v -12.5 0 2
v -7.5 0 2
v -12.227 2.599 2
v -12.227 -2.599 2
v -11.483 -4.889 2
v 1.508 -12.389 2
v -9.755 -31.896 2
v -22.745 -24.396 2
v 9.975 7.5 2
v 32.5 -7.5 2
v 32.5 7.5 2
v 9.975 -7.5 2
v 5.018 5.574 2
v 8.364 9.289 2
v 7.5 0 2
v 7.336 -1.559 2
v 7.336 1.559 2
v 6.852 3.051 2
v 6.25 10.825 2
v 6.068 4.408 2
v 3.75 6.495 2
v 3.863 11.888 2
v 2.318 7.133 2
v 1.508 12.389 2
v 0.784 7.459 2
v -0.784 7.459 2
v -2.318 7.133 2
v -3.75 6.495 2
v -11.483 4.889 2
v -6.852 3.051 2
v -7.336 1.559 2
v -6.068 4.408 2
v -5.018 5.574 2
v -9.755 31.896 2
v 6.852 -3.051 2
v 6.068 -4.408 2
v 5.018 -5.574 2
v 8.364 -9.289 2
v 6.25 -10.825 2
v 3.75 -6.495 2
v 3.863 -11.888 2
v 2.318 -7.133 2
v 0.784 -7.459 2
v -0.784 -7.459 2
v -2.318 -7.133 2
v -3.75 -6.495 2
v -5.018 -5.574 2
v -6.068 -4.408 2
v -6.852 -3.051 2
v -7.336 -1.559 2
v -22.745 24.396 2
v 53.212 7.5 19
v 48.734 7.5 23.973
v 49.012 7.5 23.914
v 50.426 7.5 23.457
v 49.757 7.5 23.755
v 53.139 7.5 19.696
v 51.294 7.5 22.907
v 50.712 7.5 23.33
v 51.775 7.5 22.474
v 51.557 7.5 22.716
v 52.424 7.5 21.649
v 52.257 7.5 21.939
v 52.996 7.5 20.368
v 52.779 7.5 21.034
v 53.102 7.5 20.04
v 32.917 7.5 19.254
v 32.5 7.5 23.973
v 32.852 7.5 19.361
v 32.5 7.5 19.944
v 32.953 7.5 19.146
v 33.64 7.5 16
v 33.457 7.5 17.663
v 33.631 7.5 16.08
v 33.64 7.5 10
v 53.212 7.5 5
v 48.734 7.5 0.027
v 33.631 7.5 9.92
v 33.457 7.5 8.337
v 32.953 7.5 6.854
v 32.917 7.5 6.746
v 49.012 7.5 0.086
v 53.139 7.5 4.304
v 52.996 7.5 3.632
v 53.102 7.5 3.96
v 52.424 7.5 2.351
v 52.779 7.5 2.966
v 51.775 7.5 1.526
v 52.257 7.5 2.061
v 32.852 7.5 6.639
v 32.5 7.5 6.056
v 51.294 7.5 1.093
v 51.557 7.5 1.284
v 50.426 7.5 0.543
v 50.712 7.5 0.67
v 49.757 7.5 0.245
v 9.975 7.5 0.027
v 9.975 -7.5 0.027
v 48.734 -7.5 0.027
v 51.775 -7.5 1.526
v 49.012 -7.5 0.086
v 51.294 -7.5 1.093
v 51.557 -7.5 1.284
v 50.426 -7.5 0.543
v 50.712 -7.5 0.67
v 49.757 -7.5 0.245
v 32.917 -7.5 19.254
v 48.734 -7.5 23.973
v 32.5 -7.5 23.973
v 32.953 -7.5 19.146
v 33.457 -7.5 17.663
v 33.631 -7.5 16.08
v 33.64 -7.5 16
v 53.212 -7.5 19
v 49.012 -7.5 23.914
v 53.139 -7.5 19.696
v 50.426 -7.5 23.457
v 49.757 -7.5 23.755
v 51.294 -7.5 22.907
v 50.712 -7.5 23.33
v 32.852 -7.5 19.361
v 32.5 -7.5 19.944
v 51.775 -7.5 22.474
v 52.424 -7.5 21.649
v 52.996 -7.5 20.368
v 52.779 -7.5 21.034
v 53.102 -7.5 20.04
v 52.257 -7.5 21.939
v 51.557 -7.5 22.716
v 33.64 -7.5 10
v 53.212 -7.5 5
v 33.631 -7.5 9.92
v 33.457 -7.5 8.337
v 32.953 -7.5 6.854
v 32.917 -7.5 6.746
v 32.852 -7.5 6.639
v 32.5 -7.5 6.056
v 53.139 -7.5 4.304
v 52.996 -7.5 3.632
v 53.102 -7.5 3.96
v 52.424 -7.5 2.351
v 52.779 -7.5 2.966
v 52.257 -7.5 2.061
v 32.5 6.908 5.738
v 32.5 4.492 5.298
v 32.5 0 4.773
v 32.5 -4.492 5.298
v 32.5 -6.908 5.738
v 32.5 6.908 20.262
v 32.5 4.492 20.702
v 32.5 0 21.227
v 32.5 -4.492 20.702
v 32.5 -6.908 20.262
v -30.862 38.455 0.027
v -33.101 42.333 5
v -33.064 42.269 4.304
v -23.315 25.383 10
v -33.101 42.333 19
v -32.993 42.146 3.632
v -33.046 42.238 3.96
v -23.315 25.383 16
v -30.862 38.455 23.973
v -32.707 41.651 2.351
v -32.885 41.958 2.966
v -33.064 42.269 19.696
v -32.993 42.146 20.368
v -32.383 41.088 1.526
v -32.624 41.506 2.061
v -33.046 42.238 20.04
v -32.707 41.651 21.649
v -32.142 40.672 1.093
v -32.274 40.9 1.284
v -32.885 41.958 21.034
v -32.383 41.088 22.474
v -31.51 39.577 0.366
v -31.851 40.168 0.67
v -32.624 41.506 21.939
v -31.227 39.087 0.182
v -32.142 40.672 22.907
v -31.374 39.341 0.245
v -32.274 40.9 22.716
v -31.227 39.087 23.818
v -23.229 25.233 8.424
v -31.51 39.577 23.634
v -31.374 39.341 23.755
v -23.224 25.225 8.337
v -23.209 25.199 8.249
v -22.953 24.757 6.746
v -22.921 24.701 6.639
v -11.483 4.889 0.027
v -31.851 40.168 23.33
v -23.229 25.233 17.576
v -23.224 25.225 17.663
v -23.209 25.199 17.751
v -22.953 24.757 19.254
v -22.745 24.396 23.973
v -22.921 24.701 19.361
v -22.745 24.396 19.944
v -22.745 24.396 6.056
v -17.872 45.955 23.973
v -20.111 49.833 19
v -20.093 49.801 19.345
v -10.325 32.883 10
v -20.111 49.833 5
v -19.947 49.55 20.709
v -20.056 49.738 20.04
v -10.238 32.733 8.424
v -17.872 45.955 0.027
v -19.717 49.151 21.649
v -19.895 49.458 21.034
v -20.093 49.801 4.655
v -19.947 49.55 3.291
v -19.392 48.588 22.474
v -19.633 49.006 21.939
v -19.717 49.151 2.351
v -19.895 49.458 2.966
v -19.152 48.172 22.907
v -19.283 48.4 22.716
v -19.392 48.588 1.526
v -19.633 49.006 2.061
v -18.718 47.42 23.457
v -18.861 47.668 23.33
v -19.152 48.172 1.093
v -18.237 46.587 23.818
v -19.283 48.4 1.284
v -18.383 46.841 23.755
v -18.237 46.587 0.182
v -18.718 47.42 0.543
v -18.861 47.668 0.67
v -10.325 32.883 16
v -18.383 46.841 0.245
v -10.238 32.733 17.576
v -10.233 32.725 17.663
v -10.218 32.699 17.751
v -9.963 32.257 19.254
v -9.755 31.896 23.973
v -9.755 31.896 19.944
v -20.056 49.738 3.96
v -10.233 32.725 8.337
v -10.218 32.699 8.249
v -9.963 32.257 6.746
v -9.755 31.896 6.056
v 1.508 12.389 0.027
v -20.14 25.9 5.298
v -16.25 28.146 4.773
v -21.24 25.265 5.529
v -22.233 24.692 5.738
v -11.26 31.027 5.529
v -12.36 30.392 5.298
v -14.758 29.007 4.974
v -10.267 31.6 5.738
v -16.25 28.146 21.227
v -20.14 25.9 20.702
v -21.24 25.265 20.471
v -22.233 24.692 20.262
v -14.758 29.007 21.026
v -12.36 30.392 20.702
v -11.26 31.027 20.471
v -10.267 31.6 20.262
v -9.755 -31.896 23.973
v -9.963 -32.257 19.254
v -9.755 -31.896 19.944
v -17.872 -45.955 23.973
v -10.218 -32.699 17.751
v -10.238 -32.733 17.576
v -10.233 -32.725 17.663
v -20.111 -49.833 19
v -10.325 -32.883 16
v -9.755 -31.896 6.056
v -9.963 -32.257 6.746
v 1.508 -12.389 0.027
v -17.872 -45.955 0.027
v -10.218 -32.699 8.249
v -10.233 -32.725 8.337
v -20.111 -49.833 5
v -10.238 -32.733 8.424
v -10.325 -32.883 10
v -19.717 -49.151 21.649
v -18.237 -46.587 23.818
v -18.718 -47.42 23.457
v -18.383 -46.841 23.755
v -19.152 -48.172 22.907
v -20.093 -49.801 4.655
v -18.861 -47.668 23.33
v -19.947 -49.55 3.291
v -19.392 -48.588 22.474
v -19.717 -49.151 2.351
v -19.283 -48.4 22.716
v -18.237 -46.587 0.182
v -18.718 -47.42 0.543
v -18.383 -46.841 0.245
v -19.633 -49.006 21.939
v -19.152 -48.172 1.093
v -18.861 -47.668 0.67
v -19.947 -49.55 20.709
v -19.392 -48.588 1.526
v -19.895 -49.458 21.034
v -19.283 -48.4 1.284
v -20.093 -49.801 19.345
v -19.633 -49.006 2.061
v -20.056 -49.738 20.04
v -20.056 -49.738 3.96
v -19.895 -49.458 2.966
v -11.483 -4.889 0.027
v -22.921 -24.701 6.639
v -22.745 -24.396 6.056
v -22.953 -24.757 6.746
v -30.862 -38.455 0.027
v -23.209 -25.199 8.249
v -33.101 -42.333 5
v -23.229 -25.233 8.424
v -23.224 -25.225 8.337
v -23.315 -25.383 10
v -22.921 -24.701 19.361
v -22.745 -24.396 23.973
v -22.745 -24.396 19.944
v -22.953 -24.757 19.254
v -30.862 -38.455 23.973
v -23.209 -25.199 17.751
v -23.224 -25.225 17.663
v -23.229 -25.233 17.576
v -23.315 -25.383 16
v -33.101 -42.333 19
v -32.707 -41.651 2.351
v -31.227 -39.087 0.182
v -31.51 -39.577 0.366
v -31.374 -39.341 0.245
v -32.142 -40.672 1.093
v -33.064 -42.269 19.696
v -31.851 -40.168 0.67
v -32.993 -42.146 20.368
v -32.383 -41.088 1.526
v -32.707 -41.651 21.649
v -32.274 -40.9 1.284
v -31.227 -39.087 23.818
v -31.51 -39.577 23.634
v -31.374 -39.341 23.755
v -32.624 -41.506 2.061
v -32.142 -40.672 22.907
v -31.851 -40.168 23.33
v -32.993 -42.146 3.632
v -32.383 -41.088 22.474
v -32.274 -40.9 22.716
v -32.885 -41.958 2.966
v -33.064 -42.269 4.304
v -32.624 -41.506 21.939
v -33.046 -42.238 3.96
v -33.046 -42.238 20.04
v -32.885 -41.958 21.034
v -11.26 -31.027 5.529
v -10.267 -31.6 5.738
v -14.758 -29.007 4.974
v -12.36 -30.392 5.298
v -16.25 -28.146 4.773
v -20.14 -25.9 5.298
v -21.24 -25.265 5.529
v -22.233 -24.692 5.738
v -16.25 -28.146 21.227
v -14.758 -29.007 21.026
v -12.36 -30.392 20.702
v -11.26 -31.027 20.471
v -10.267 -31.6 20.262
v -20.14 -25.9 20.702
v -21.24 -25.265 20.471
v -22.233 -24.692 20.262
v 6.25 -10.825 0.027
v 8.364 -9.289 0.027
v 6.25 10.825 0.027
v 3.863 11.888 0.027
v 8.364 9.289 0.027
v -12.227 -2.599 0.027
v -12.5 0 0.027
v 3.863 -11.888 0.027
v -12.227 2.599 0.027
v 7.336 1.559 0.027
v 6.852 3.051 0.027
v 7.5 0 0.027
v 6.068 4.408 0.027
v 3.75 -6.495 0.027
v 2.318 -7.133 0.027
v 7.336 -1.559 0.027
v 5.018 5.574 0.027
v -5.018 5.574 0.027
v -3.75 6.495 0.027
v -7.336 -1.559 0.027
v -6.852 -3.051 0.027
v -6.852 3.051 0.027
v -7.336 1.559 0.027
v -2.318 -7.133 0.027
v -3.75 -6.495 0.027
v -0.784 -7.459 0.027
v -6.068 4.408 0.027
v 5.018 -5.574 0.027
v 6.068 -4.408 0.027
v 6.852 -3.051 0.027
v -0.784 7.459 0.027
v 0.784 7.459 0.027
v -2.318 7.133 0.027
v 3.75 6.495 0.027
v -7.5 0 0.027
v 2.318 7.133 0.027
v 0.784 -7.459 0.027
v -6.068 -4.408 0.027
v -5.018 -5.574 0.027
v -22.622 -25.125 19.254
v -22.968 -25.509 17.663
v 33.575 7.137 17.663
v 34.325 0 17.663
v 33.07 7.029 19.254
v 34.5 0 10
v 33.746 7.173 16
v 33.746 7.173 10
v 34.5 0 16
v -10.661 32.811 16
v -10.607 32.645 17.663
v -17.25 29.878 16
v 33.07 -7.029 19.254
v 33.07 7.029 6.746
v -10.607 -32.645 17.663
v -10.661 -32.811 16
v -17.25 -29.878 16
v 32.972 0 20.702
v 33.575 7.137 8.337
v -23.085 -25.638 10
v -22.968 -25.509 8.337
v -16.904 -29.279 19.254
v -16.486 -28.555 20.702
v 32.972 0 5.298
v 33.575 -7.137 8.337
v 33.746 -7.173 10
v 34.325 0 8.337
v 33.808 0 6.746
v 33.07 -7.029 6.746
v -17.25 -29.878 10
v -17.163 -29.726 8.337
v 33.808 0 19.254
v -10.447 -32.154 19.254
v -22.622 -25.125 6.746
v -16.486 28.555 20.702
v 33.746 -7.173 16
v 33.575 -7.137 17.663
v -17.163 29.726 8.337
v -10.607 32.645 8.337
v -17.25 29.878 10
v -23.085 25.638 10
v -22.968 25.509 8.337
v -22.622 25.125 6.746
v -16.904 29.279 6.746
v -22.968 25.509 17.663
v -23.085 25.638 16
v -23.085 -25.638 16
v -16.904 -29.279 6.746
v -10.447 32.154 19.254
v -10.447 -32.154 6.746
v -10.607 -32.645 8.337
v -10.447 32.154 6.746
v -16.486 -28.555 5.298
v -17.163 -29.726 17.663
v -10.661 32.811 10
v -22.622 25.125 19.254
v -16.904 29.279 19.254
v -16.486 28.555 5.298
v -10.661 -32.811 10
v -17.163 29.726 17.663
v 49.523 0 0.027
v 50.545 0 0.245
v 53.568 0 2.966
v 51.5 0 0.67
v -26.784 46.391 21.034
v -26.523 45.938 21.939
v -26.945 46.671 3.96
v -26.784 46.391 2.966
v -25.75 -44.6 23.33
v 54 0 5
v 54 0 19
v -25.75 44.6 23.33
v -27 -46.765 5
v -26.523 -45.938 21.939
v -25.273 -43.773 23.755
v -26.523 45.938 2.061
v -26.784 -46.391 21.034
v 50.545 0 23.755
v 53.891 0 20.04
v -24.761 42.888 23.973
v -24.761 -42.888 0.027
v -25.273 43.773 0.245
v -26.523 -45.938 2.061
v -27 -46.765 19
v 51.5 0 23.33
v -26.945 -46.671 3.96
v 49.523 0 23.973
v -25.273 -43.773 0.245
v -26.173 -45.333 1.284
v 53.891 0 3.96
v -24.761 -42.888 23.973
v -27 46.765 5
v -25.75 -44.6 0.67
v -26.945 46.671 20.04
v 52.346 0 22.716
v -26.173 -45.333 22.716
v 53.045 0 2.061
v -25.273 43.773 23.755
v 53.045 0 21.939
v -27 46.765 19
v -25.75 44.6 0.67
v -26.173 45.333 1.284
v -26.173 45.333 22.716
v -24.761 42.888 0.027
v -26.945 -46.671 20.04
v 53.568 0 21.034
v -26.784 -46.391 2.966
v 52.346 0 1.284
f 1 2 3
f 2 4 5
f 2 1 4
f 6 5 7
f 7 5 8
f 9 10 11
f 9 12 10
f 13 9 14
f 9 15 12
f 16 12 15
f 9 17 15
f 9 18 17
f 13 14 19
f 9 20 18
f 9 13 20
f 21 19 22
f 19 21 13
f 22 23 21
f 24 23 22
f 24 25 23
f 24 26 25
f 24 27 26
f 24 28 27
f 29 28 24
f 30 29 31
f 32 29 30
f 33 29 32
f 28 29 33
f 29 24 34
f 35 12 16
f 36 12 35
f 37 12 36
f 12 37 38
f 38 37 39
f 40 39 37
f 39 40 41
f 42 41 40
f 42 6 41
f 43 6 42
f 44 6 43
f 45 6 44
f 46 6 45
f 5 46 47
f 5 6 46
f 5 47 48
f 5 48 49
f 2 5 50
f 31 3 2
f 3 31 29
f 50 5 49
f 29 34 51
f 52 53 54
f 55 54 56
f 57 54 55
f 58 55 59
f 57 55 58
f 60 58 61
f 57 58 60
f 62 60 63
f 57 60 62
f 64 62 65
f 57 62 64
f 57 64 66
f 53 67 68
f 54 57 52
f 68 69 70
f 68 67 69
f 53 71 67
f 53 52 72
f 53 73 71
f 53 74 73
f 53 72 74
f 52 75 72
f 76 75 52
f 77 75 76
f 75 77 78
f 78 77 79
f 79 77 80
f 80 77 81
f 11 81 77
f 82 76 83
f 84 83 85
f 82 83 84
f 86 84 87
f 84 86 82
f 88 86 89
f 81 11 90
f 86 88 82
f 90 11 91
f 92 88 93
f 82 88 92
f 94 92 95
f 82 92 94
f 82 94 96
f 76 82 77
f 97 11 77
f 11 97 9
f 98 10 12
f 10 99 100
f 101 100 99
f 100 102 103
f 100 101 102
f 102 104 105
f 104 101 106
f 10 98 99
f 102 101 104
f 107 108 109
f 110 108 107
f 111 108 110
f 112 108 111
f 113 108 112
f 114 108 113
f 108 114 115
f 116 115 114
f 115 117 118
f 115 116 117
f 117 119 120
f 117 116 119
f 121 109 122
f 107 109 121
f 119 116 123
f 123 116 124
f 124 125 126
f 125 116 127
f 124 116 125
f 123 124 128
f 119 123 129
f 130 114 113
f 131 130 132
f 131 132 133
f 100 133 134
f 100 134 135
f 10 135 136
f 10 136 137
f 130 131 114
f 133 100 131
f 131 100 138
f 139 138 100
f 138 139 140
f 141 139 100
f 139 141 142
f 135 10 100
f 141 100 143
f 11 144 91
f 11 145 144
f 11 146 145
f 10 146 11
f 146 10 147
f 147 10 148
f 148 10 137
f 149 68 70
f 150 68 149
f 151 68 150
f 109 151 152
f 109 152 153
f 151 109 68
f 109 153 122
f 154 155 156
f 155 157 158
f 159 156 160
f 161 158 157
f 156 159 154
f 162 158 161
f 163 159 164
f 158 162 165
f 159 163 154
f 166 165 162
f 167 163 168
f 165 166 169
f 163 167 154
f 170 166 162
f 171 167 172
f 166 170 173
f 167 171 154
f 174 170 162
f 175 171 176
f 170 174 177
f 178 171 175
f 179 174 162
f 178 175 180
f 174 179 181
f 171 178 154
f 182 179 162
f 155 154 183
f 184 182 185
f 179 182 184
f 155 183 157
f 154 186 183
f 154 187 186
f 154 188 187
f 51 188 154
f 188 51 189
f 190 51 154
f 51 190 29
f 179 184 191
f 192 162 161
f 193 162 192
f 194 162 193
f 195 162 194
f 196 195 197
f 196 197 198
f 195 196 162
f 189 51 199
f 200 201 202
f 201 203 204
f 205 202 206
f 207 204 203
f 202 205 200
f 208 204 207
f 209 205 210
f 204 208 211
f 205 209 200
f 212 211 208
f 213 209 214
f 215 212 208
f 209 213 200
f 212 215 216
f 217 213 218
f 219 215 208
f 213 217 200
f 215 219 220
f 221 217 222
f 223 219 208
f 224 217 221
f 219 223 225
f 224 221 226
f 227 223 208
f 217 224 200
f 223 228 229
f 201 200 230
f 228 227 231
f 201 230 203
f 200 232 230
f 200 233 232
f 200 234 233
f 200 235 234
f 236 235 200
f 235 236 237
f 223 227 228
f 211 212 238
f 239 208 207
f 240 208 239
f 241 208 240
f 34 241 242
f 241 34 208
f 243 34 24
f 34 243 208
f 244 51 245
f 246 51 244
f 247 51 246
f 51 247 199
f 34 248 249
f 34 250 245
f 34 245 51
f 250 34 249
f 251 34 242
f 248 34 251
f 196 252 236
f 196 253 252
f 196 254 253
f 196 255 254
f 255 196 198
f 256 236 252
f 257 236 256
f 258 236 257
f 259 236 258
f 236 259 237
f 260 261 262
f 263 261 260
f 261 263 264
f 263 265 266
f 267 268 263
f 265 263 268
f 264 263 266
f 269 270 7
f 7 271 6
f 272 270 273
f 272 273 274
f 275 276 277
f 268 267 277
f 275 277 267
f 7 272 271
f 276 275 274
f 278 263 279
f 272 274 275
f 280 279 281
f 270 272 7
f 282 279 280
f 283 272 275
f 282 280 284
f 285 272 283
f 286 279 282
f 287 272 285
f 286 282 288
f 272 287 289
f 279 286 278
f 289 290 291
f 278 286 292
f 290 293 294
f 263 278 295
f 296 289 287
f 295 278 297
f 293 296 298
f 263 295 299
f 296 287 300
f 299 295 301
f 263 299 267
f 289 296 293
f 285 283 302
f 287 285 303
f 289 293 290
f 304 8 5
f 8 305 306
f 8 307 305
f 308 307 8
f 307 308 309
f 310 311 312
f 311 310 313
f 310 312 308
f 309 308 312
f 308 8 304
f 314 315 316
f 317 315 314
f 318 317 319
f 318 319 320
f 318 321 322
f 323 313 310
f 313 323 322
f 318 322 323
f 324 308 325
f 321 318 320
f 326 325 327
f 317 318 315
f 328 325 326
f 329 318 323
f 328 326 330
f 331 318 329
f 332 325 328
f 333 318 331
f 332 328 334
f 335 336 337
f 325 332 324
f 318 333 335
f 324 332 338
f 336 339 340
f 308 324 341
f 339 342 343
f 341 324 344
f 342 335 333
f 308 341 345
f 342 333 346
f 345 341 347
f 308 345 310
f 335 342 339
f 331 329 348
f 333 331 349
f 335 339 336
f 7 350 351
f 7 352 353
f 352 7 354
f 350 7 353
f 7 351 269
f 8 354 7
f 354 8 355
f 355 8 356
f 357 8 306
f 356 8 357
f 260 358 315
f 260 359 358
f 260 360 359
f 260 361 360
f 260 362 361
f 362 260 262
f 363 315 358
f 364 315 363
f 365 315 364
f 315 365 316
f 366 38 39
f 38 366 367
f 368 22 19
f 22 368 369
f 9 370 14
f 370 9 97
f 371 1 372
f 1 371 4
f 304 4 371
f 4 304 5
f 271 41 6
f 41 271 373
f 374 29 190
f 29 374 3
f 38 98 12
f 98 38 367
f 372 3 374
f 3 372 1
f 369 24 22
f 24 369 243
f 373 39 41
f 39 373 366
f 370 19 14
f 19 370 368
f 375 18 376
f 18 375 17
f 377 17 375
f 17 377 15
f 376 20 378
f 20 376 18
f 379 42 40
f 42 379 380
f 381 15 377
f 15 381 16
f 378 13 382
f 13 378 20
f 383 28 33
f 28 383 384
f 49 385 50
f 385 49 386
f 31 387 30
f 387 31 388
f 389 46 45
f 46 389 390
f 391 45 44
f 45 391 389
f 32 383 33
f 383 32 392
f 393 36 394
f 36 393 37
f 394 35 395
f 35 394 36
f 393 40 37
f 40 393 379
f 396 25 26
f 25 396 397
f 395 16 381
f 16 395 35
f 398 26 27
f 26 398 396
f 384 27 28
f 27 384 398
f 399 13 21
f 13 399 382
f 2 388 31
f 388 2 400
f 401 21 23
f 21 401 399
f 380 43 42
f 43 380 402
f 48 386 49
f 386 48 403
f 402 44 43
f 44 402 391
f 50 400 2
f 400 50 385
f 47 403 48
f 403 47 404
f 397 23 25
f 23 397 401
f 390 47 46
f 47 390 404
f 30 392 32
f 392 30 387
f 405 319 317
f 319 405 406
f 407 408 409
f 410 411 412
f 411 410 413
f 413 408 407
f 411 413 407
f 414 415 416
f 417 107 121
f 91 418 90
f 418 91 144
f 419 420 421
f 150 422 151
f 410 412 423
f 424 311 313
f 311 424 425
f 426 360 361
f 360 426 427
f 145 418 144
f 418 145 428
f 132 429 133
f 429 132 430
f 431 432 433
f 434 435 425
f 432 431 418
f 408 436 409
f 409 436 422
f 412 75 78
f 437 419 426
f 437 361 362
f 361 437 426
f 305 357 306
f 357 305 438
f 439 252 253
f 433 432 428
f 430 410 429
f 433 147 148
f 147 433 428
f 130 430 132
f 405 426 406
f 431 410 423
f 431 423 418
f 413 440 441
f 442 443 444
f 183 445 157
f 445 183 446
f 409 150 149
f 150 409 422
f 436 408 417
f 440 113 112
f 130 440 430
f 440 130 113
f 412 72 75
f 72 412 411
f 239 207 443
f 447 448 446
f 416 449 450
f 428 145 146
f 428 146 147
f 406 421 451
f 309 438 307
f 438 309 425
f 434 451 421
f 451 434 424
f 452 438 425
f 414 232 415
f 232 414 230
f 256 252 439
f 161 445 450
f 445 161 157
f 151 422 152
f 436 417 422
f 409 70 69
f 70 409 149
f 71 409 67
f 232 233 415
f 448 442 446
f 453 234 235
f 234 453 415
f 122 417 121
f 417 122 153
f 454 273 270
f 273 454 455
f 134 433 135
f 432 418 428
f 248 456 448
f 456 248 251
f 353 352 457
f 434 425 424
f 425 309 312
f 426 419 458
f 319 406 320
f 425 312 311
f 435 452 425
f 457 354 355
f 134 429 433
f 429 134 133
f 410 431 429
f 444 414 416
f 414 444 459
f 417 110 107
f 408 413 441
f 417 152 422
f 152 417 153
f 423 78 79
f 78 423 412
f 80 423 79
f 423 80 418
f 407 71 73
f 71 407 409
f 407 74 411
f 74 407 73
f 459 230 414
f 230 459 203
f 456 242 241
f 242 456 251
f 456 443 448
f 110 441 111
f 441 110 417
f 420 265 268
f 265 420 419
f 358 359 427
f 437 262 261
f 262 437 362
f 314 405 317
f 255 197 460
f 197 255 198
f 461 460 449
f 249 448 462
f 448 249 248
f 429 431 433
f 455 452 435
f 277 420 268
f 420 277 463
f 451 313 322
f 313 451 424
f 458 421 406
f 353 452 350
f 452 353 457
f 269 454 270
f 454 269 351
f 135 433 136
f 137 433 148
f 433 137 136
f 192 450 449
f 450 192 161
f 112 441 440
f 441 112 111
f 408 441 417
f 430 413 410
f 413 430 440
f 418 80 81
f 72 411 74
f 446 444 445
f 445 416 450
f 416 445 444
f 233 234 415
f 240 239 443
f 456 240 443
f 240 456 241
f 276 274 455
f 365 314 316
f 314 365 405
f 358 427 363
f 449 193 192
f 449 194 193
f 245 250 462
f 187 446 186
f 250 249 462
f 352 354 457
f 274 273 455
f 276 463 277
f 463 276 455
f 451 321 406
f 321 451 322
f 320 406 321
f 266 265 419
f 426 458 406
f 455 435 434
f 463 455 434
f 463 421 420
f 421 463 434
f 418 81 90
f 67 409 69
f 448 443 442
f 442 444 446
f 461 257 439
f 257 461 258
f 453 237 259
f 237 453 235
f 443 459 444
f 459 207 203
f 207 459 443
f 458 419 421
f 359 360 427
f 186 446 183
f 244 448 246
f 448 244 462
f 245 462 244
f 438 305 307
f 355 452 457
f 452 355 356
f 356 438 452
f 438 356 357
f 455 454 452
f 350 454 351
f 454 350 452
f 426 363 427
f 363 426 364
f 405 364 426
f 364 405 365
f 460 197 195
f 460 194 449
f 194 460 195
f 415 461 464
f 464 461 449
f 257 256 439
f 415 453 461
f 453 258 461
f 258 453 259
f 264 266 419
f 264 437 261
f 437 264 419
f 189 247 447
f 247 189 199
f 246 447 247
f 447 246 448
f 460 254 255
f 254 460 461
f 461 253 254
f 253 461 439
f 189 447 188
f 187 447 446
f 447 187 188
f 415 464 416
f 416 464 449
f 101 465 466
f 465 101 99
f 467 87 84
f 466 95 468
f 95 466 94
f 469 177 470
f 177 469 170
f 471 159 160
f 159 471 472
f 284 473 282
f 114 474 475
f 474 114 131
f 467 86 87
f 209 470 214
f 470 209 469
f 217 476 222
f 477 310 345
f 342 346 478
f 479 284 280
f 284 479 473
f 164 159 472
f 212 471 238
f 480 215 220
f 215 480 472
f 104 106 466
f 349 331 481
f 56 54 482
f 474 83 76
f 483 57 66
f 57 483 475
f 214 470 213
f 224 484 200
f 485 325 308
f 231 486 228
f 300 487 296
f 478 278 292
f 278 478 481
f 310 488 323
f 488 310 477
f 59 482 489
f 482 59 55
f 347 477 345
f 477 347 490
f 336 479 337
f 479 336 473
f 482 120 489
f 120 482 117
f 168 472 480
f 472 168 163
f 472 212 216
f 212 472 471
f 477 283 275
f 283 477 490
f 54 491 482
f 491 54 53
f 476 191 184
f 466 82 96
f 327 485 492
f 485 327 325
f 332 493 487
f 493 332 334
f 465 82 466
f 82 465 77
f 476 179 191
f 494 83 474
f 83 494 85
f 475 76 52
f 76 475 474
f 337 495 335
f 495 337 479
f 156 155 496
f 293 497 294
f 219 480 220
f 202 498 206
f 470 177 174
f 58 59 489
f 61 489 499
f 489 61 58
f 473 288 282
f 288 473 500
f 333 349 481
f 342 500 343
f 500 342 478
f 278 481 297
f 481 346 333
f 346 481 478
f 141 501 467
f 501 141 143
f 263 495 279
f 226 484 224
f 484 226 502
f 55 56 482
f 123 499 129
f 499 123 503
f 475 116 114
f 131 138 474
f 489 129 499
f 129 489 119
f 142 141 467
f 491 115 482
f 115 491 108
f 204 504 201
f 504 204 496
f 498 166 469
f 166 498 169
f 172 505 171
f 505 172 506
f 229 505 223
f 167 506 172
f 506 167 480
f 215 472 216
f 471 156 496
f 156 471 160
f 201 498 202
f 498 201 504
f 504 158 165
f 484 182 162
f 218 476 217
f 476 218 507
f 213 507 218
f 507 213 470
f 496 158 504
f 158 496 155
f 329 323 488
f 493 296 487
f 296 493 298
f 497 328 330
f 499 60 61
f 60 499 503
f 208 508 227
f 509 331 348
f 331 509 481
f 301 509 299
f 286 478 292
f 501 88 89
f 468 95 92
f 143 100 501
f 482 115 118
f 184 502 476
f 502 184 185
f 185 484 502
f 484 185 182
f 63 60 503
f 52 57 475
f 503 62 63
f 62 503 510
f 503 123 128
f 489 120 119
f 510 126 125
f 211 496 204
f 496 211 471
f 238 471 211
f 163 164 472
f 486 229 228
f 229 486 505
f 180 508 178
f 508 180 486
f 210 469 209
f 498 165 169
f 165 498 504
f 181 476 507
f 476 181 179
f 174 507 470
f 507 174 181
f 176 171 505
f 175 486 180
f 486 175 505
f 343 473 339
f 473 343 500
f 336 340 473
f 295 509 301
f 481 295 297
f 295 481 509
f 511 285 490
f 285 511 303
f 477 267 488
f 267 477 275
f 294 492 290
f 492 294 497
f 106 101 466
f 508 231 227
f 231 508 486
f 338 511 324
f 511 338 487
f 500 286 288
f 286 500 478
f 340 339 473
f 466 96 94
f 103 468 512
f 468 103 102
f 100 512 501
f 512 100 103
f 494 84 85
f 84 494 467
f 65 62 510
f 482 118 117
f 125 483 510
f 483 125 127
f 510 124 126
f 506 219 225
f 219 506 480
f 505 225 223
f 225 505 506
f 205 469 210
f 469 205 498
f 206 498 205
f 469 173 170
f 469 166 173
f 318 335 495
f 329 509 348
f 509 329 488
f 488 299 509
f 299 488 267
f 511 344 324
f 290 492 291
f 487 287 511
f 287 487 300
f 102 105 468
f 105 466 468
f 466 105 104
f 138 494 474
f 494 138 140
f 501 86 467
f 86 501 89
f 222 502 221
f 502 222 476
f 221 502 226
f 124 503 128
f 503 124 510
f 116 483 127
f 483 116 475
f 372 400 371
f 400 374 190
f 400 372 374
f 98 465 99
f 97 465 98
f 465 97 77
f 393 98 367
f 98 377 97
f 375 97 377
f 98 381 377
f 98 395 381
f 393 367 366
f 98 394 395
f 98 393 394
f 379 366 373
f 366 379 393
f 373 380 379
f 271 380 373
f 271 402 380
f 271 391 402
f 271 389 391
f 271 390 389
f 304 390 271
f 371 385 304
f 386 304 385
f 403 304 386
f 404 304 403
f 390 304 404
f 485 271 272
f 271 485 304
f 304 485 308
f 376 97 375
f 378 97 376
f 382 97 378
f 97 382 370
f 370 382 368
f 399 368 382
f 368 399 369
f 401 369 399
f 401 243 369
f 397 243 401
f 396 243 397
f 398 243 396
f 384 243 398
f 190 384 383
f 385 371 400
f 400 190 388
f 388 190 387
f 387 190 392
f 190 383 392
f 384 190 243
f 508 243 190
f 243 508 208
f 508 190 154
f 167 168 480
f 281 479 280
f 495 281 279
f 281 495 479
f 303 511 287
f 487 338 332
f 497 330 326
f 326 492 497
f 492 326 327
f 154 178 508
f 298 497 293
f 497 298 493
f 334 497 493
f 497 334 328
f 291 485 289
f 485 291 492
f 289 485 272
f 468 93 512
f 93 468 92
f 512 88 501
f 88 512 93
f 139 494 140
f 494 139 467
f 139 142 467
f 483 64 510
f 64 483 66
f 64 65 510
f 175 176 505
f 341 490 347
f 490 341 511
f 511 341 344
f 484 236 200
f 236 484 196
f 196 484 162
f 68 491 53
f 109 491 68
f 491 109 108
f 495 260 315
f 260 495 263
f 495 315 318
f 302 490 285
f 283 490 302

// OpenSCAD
/*
  RC plane wheel wedge
  
  (c) 2018 Janne Mäntyharju
*/

// Thickness of support plate
thickness = 2;

// Diameter of support disk
middle_disk_diameter = 25;

// Tire diameter
tire_diameter = 69;

// Tire width
tire_width = 22;

// Tire rounding
tire_rounding = 8;

// Diameter of center hole to leave space for wheel collar
center_hole_diameter = 15;

// Width of support arms
arm_width = 15;

// ignore variable values
$fn = 30;
wedge_size_multiplier = 2.5;
outer_radius = (tire_diameter / 2) + thickness * wedge_size_multiplier * 0.8;

x = ((tire_diameter /2) / cos(60)) - arm_width;

// EMBEDDED rcube.scad MODULE

// Rounded primitives for openscad
// (c) 2013 Wouter Robers 

// Syntax example for a rounded block
//translate([-15,0,10]) rcube([20,20,20],2);

// Syntax example for a rounded cylinder
//translate([15,0,10]) rcylinder(r1=15,r2=10,h=20,b=2);

module rcube(Size=[20,20,20],b=2)
{hull(){for(x=[-(Size[0]/2-b),(Size[0]/2-b)]){for(y=[-(Size[1]/2-b),(Size[1]/2-b)]){for(z=[-(Size[2]/2-b),(Size[2]/2-b)]){ translate([x,y,z]) sphere(b);}}}}}


module rcylinder(r1=10,r2=10,h=10,b=2)
{translate([0,0,-h/2]) hull(){rotate_extrude() translate([r1-b,b,0]) circle(r = b); rotate_extrude() translate([r2-b, h-b, 0]) circle(r = b);}}

module arm(angle) {
    rotate([0,0,angle]) {
        union() {
            translate([0,arm_width * -0.5,0]) cube([tire_diameter / 2, arm_width, thickness]);
            translate([(tire_diameter / 2) - thickness, arm_width * -0.5, 0]) cube([x - ((tire_diameter / 2) - thickness), arm_width, thickness + tire_width]);
        }
    }
}

intersection() {
    difference() {
        union() {
            cylinder(thickness, middle_disk_diameter / 2, middle_disk_diameter / 2);
            arm(0);
            arm(120);
            arm(-120);
        }
        cylinder(thickness * 2, center_hole_diameter / 2, center_hole_diameter / 2);
        #translate([0,0,thickness + tire_width /2]) rcylinder(tire_diameter /2 , tire_diameter / 2, tire_width, tire_rounding);
    }
    translate([0,0,(tire_width + thickness) /2]) rcylinder(x , x, tire_width + thickness, 5);
}
